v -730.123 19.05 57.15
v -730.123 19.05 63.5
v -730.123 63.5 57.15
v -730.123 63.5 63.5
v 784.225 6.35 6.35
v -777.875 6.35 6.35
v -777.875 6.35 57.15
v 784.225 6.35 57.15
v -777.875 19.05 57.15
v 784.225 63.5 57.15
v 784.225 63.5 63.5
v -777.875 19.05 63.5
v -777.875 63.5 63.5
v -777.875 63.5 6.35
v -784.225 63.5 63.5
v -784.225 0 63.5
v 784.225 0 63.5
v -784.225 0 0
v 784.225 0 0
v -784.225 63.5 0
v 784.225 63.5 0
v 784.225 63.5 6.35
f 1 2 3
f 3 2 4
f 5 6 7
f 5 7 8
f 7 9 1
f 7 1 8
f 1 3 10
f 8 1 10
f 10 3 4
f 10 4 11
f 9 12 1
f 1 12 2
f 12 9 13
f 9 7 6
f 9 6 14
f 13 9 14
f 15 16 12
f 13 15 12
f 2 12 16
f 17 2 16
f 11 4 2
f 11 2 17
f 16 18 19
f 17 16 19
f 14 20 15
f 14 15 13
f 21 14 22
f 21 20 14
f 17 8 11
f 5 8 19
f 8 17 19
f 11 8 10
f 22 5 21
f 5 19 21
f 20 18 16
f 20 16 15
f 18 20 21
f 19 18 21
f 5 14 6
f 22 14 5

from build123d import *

# Parameters (mm, degrees)
SKETCH1_W           = 1568.45
SKETCH1_H           = 63.5
BOSS_EXTRUDE1_DEPTH = 63.5
SHELL1_T            = -6.35
SKETCH3_W           = 47.752
SKETCH3_H           = 44.45
CUT_EXTRUDE1_DEPTH  = 6.35


with BuildPart() as part:
    # Sketch1 → Boss-Extrude1 (new body)
    with BuildSketch(Plane.XY):
        with Locations((0, 31.75)):
            Rectangle(SKETCH1_W, SKETCH1_H)
    extrude(amount=BOSS_EXTRUDE1_DEPTH)

    # Shell1
    shell1_openings = [part.faces().sort_by_distance(p)[0] for p in [
        (0, 63.5, 31.75),
        (784.225, 31.75, 31.75),
    ]]
    offset(amount=SHELL1_T, openings=shell1_openings, kind=Kind.INTERSECTION)

    # Sketch3 → Cut-Extrude1 (cut)
    with BuildSketch(Plane.XY.offset(63.5)):
        with Locations((-753.999, 41.275)):
            Rectangle(SKETCH3_W, SKETCH3_H)
    extrude(amount=-CUT_EXTRUDE1_DEPTH, mode=Mode.SUBTRACT)


solid = part.part
